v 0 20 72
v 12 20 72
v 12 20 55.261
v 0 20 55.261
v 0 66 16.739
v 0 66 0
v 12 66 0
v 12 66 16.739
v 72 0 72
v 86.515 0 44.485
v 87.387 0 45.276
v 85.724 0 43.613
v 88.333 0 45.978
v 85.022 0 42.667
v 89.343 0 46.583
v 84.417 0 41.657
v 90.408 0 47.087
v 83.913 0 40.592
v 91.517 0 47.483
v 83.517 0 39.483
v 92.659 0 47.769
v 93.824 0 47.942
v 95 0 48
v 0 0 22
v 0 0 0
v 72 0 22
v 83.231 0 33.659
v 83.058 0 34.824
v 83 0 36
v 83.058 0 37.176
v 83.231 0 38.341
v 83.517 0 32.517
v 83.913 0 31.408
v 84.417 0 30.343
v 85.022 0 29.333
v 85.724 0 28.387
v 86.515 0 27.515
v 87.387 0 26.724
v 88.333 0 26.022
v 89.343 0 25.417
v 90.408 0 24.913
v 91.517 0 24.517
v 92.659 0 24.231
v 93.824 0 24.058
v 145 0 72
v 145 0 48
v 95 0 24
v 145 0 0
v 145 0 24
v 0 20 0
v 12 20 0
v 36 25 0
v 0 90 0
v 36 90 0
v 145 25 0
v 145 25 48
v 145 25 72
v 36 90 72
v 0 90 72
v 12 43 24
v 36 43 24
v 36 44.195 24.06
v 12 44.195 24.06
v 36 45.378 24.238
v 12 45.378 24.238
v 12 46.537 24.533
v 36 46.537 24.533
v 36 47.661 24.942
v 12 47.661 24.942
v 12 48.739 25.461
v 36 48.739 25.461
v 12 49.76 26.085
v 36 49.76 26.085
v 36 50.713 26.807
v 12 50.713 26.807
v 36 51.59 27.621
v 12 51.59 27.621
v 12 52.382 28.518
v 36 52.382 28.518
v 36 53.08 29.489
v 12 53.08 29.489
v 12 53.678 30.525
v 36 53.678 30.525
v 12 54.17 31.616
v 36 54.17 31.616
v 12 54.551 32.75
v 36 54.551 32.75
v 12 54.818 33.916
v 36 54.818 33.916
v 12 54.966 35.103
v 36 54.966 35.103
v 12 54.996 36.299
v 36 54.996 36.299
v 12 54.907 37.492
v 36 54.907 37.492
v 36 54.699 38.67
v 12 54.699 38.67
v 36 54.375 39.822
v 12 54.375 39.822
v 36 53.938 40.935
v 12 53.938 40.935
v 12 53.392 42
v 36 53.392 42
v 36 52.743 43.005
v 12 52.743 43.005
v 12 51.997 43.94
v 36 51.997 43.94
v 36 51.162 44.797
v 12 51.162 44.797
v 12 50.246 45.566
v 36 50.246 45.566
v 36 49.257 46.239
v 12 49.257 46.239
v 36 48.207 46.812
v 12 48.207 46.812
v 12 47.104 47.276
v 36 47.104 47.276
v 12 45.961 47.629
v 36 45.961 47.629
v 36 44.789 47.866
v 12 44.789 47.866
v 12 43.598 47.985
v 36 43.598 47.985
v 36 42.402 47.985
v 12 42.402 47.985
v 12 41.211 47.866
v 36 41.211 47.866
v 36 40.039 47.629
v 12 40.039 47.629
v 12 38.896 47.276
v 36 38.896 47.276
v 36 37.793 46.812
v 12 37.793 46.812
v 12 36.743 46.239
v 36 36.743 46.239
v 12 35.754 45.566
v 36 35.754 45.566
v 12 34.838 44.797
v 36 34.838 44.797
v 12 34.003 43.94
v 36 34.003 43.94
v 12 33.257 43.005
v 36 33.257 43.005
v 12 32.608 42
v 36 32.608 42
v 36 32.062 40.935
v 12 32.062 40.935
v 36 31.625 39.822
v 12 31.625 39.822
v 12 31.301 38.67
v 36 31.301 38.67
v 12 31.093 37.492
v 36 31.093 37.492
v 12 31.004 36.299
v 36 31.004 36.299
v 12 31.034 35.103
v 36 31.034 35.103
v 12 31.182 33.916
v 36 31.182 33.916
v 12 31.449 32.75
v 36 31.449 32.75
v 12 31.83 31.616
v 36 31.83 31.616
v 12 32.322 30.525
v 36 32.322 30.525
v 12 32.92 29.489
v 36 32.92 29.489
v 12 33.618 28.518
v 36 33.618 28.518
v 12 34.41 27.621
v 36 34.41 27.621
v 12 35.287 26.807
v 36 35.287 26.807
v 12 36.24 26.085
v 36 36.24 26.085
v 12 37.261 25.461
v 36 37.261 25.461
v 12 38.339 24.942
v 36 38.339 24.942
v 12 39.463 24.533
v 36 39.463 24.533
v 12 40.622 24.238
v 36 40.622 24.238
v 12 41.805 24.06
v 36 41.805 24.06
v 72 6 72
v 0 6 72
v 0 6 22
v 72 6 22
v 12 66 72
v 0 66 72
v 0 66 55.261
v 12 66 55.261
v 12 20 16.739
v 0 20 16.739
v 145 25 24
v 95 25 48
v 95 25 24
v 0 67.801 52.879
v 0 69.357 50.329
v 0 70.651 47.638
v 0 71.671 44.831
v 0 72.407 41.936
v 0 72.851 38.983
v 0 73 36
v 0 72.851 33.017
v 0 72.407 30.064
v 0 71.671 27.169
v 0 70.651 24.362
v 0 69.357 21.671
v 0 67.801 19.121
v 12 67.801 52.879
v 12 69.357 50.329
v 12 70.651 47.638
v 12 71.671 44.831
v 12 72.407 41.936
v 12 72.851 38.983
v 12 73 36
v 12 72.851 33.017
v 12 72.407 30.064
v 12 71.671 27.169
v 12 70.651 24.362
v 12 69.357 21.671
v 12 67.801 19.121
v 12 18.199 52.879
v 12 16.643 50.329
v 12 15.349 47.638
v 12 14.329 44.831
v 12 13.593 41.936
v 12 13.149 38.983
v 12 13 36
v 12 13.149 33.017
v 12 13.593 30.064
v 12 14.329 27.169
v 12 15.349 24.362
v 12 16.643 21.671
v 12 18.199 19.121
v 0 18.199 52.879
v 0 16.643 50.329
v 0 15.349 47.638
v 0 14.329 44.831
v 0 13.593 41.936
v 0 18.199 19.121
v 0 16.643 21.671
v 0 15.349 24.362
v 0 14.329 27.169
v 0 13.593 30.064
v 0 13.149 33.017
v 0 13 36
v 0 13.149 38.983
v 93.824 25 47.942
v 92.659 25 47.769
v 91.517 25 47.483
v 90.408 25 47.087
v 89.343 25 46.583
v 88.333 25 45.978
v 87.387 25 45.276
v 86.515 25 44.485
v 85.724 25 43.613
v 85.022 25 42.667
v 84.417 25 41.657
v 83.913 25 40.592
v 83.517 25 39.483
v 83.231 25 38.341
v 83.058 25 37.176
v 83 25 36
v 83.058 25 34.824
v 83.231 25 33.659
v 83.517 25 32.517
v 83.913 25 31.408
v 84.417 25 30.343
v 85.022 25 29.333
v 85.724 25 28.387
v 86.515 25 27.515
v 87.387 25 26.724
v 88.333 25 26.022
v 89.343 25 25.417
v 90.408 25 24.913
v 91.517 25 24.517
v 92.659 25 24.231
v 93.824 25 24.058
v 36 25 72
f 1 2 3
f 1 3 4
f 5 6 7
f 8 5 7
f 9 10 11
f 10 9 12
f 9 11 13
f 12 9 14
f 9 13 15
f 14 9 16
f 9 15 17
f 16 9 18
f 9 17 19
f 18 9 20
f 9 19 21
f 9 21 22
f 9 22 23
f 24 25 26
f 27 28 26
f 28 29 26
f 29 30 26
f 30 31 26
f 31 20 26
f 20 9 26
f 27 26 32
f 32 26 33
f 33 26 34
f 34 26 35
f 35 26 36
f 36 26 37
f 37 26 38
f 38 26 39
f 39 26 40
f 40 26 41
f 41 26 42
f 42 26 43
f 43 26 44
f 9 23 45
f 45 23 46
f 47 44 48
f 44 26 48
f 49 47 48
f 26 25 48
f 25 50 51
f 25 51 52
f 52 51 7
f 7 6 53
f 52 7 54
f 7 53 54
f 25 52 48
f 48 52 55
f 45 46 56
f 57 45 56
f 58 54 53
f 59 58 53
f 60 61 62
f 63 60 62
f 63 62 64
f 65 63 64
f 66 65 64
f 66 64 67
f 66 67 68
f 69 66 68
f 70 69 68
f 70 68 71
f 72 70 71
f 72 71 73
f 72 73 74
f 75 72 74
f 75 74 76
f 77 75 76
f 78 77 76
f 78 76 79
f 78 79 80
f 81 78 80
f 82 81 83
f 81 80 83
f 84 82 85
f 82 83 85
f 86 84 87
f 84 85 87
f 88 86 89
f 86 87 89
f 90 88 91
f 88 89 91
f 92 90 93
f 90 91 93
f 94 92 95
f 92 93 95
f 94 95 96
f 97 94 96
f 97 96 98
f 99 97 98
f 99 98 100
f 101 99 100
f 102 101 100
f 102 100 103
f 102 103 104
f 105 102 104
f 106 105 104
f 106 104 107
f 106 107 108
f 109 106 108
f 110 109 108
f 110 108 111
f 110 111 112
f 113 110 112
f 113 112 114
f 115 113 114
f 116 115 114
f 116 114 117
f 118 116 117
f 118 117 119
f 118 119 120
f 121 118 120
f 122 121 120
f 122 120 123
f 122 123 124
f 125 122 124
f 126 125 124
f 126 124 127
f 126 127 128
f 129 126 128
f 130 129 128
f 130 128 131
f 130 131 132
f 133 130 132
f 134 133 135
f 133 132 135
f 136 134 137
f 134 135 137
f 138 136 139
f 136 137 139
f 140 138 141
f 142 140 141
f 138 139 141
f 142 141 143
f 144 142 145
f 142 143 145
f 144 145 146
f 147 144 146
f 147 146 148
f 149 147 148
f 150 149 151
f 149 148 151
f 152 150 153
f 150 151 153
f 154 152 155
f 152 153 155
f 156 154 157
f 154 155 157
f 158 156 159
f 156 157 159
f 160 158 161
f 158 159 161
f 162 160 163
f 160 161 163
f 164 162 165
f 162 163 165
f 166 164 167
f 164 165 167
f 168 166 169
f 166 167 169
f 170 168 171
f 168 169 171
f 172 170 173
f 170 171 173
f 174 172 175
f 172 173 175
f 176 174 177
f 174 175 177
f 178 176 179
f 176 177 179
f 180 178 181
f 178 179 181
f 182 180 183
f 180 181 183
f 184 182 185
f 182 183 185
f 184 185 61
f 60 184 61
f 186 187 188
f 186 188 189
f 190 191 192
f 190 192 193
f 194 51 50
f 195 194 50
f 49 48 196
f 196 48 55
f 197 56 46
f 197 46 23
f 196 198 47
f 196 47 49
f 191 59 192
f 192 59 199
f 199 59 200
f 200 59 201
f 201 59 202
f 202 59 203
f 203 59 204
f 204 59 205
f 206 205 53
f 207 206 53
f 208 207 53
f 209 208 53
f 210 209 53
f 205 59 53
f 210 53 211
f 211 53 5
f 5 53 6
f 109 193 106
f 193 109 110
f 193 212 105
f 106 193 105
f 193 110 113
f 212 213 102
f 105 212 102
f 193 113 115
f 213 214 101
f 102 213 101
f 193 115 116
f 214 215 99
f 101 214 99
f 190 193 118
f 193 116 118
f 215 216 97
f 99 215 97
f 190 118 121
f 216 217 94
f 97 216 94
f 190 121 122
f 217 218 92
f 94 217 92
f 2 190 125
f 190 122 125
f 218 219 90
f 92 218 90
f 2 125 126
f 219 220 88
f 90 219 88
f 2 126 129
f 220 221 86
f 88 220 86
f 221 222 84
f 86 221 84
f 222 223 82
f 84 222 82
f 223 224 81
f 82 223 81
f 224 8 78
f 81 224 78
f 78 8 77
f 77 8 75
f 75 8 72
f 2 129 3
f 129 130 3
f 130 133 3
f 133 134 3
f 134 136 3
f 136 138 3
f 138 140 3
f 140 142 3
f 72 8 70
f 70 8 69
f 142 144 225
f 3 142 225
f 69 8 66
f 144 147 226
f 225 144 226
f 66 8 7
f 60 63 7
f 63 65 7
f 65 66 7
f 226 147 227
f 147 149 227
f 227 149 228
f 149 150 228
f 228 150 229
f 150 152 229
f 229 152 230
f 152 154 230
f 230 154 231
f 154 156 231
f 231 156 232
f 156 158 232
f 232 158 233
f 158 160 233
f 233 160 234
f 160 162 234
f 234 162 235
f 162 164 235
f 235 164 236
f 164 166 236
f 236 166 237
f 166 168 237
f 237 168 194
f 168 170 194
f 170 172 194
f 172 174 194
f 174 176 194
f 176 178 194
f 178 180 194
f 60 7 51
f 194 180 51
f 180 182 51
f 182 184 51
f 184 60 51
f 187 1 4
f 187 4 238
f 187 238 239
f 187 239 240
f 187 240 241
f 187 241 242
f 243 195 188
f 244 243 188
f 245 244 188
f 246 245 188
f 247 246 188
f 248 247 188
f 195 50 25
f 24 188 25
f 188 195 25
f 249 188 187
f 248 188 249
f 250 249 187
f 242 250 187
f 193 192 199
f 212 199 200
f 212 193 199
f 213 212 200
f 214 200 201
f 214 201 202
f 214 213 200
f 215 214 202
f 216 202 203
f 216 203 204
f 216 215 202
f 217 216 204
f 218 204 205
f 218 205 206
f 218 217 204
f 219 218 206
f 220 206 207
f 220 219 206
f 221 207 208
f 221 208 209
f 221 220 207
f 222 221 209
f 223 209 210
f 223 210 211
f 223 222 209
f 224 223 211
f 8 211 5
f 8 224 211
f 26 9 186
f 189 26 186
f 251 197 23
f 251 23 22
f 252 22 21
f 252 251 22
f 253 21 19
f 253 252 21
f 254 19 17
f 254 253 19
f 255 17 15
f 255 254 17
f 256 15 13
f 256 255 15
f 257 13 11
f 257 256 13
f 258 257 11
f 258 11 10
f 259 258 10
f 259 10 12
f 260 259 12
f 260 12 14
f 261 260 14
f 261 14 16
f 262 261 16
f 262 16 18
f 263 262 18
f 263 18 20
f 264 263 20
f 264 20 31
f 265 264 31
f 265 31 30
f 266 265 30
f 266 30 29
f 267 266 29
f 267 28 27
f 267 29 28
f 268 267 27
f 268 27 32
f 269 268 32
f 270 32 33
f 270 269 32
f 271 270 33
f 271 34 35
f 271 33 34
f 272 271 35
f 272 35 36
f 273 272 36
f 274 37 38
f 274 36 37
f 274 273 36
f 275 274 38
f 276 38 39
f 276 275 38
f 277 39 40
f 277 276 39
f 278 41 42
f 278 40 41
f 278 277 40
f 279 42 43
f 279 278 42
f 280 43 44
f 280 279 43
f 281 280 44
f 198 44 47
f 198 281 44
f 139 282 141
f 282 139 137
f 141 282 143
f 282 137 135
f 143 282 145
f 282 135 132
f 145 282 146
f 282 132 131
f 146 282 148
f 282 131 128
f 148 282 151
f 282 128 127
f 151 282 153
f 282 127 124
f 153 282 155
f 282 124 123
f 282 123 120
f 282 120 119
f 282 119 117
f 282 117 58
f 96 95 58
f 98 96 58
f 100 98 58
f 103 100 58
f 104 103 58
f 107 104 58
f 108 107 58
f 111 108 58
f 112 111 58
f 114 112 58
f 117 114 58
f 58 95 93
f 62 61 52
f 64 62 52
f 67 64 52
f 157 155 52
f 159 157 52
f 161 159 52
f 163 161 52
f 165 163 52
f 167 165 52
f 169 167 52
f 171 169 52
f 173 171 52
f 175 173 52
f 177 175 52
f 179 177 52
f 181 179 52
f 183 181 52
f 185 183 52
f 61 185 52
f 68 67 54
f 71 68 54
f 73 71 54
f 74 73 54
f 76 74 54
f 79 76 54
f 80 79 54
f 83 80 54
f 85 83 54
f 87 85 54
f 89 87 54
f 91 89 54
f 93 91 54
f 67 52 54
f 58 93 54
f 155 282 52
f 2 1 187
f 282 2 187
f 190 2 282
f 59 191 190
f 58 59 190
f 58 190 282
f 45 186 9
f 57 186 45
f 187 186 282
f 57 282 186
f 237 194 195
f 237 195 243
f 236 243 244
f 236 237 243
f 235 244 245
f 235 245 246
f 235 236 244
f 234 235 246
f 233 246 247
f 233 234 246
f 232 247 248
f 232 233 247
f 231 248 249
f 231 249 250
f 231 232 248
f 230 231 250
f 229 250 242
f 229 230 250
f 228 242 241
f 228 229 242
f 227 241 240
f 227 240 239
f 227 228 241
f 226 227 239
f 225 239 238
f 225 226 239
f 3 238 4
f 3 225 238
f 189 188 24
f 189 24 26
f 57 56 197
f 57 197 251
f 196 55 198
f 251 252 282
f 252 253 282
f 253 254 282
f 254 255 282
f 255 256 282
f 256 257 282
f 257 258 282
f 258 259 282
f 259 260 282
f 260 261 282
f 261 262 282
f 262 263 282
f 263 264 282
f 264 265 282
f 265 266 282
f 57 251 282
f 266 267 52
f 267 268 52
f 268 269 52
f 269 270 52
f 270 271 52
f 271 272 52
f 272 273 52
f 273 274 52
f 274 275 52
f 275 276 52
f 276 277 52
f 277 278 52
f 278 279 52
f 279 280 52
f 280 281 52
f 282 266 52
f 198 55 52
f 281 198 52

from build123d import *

# Parameters (mm, degrees)
BOSS_EXTRUDE1_DEPTH    = 72
SKETCH2_W              = 72
SKETCH2_H              = 6
CUT_EXTRUDE1_DEPTH     = 50
SKETCH3_R              = 30
CUT_EXTRUDE2_DEPTH     = 12
F_20_0MM_DOWEL_HOLE1_D = 24
CUT_EXTRUDE3_REACH     = 176.453


with BuildPart() as part:
    # Sketch1 → Boss-Extrude1 (new body)
    with BuildSketch(Plane.XY):
        Polygon((0, 66), (12, 66), (12, 20), (0, 20), (0, 0), (29.646636928, 0), (145, 0), (145, 25), (36, 25), (36, 90), (0, 90), align=None)
    extrude(amount=BOSS_EXTRUDE1_DEPTH)

    # Sketch2 → Cut-Extrude1 (cut)
    with BuildSketch(Plane.XY.offset(72)):
        with Locations((36, 3)):
            Rectangle(SKETCH2_W, SKETCH2_H)
    extrude(amount=-CUT_EXTRUDE1_DEPTH, mode=Mode.SUBTRACT)

    # Sketch3 → Cut-Extrude2 (cut)
    with BuildSketch(Plane.ZY.offset(-12)):
        with Locations((36, 43)):
            Circle(SKETCH3_R)
    extrude(amount=CUT_EXTRUDE2_DEPTH, mode=Mode.SUBTRACT)

    # Ø20.0mm Dowel Hole1 (through all)
    with Locations(Plane.ZY.offset(-12)):
        with Locations((36, 43)):
            Hole(F_20_0MM_DOWEL_HOLE1_D / 2)

    # Sketch8 → Cut-Extrude3 (cut, up to next)
    with BuildSketch(Plane(origin=(0, 25, 0), x_dir=(1, 0, 0), z_dir=(0, 1, 0)), mode=Mode.PRIVATE) as cut_extrude3_sk1:
        with BuildLine():
            Line((195, -48), (95, -48))
            ThreePointArc((95, -48), (83, -36), (95, -24))
            Line((95, -24), (195, -24))
            ThreePointArc((195, -24), (207, -36), (195, -48))
        make_face()
    cut_extrude3_tool1 = extrude(cut_extrude3_sk1.sketch, amount=-CUT_EXTRUDE3_REACH, mode=Mode.PRIVATE) & part.part
    add(cut_extrude3_tool1.solids().sort_by_distance((145, 25, 36))[0], mode=Mode.SUBTRACT)


solid = part.part
